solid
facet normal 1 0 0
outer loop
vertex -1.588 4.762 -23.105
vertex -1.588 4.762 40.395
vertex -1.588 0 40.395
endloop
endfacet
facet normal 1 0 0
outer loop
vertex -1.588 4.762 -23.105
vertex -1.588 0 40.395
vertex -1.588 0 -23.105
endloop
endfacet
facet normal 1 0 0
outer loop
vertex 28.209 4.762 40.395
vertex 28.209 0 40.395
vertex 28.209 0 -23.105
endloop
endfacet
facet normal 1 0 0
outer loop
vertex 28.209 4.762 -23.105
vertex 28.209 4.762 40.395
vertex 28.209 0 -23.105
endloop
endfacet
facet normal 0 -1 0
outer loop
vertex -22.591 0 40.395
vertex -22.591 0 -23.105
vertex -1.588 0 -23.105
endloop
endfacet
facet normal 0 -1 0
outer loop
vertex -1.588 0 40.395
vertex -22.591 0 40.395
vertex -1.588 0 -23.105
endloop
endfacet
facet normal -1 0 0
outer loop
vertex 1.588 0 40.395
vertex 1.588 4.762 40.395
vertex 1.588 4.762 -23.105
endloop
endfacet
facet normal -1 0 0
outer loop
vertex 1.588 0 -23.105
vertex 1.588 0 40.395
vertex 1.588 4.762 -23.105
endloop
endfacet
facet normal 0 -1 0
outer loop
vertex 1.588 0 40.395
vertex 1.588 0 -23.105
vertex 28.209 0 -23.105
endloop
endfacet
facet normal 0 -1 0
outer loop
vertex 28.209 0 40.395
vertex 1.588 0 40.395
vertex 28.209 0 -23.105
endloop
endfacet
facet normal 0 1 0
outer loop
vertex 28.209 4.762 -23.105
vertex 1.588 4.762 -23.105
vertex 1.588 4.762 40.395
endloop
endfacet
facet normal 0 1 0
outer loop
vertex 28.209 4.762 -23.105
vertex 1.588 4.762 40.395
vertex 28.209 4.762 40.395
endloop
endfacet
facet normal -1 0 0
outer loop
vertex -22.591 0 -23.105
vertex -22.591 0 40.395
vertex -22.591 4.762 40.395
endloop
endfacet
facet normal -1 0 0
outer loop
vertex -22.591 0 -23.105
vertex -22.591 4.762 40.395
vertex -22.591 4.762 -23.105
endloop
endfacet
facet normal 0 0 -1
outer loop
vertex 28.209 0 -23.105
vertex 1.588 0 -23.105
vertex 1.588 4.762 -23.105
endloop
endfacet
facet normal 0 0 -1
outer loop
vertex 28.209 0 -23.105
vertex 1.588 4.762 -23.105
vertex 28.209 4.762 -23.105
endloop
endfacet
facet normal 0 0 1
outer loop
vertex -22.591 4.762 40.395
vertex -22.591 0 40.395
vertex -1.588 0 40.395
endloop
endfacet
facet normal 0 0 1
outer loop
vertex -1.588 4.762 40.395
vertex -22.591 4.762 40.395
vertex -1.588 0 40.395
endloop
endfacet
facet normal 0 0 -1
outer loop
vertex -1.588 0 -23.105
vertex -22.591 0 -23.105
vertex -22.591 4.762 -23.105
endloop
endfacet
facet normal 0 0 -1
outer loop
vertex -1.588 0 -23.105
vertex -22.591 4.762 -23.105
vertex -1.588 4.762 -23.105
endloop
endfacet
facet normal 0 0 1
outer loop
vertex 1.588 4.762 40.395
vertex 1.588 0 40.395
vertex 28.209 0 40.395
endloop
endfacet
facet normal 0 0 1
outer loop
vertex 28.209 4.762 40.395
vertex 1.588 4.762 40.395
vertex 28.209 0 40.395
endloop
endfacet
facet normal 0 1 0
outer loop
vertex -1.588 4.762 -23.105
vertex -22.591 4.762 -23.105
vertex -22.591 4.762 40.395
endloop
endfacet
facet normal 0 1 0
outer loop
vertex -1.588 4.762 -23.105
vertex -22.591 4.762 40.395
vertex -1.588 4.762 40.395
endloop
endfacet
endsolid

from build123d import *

# Parameters (mm, degrees)
SKETCH1_W           = 50.8
SKETCH1_H           = 63.5
BOSS_EXTRUDE1_DEPTH = 4.7625
SKETCH2_W           = 3.175
SKETCH2_H           = 63.5
CUT_EXTRUDE1_DEPTH  = 10


with BuildPart() as part:
    # Sketch1 → Boss-Extrude1 (new body)
    with BuildSketch(Plane(origin=(0, 0, 0), x_dir=(1, 0, 0), z_dir=(0, 1, 0))):
        with Locations((2.808564244, -8.645122522)):
            Rectangle(SKETCH1_W, SKETCH1_H)
    extrude(amount=BOSS_EXTRUDE1_DEPTH)

    # Sketch2 → Cut-Extrude1 (cut)
    with BuildSketch(Plane(origin=(0, 4.7625, 0), x_dir=(1, 0, 0), z_dir=(0, 1, 0))):
        with Locations((0, -8.645122522)):
            Rectangle(SKETCH2_W, SKETCH2_H)
    extrude(amount=-CUT_EXTRUDE1_DEPTH, mode=Mode.SUBTRACT)


with BuildPart() as cut_extrude1_piece_1:
    # of the separate pieces the step leaves, piece 1, a body of its own (cut_extrude1_pieces)
    add(part.part.solids().sort_by_distance((28.208564244, 0, -23.104877478))[0])


with BuildPart() as cut_extrude1_piece_2:
    # of the separate pieces the step leaves, piece 2, a body of its own (cut_extrude1_pieces)
    add(part.part.solids().sort_by_distance((-1.5875, 0, -23.104877478))[0])


solid = Compound([cut_extrude1_piece_1.part, cut_extrude1_piece_2.part])
